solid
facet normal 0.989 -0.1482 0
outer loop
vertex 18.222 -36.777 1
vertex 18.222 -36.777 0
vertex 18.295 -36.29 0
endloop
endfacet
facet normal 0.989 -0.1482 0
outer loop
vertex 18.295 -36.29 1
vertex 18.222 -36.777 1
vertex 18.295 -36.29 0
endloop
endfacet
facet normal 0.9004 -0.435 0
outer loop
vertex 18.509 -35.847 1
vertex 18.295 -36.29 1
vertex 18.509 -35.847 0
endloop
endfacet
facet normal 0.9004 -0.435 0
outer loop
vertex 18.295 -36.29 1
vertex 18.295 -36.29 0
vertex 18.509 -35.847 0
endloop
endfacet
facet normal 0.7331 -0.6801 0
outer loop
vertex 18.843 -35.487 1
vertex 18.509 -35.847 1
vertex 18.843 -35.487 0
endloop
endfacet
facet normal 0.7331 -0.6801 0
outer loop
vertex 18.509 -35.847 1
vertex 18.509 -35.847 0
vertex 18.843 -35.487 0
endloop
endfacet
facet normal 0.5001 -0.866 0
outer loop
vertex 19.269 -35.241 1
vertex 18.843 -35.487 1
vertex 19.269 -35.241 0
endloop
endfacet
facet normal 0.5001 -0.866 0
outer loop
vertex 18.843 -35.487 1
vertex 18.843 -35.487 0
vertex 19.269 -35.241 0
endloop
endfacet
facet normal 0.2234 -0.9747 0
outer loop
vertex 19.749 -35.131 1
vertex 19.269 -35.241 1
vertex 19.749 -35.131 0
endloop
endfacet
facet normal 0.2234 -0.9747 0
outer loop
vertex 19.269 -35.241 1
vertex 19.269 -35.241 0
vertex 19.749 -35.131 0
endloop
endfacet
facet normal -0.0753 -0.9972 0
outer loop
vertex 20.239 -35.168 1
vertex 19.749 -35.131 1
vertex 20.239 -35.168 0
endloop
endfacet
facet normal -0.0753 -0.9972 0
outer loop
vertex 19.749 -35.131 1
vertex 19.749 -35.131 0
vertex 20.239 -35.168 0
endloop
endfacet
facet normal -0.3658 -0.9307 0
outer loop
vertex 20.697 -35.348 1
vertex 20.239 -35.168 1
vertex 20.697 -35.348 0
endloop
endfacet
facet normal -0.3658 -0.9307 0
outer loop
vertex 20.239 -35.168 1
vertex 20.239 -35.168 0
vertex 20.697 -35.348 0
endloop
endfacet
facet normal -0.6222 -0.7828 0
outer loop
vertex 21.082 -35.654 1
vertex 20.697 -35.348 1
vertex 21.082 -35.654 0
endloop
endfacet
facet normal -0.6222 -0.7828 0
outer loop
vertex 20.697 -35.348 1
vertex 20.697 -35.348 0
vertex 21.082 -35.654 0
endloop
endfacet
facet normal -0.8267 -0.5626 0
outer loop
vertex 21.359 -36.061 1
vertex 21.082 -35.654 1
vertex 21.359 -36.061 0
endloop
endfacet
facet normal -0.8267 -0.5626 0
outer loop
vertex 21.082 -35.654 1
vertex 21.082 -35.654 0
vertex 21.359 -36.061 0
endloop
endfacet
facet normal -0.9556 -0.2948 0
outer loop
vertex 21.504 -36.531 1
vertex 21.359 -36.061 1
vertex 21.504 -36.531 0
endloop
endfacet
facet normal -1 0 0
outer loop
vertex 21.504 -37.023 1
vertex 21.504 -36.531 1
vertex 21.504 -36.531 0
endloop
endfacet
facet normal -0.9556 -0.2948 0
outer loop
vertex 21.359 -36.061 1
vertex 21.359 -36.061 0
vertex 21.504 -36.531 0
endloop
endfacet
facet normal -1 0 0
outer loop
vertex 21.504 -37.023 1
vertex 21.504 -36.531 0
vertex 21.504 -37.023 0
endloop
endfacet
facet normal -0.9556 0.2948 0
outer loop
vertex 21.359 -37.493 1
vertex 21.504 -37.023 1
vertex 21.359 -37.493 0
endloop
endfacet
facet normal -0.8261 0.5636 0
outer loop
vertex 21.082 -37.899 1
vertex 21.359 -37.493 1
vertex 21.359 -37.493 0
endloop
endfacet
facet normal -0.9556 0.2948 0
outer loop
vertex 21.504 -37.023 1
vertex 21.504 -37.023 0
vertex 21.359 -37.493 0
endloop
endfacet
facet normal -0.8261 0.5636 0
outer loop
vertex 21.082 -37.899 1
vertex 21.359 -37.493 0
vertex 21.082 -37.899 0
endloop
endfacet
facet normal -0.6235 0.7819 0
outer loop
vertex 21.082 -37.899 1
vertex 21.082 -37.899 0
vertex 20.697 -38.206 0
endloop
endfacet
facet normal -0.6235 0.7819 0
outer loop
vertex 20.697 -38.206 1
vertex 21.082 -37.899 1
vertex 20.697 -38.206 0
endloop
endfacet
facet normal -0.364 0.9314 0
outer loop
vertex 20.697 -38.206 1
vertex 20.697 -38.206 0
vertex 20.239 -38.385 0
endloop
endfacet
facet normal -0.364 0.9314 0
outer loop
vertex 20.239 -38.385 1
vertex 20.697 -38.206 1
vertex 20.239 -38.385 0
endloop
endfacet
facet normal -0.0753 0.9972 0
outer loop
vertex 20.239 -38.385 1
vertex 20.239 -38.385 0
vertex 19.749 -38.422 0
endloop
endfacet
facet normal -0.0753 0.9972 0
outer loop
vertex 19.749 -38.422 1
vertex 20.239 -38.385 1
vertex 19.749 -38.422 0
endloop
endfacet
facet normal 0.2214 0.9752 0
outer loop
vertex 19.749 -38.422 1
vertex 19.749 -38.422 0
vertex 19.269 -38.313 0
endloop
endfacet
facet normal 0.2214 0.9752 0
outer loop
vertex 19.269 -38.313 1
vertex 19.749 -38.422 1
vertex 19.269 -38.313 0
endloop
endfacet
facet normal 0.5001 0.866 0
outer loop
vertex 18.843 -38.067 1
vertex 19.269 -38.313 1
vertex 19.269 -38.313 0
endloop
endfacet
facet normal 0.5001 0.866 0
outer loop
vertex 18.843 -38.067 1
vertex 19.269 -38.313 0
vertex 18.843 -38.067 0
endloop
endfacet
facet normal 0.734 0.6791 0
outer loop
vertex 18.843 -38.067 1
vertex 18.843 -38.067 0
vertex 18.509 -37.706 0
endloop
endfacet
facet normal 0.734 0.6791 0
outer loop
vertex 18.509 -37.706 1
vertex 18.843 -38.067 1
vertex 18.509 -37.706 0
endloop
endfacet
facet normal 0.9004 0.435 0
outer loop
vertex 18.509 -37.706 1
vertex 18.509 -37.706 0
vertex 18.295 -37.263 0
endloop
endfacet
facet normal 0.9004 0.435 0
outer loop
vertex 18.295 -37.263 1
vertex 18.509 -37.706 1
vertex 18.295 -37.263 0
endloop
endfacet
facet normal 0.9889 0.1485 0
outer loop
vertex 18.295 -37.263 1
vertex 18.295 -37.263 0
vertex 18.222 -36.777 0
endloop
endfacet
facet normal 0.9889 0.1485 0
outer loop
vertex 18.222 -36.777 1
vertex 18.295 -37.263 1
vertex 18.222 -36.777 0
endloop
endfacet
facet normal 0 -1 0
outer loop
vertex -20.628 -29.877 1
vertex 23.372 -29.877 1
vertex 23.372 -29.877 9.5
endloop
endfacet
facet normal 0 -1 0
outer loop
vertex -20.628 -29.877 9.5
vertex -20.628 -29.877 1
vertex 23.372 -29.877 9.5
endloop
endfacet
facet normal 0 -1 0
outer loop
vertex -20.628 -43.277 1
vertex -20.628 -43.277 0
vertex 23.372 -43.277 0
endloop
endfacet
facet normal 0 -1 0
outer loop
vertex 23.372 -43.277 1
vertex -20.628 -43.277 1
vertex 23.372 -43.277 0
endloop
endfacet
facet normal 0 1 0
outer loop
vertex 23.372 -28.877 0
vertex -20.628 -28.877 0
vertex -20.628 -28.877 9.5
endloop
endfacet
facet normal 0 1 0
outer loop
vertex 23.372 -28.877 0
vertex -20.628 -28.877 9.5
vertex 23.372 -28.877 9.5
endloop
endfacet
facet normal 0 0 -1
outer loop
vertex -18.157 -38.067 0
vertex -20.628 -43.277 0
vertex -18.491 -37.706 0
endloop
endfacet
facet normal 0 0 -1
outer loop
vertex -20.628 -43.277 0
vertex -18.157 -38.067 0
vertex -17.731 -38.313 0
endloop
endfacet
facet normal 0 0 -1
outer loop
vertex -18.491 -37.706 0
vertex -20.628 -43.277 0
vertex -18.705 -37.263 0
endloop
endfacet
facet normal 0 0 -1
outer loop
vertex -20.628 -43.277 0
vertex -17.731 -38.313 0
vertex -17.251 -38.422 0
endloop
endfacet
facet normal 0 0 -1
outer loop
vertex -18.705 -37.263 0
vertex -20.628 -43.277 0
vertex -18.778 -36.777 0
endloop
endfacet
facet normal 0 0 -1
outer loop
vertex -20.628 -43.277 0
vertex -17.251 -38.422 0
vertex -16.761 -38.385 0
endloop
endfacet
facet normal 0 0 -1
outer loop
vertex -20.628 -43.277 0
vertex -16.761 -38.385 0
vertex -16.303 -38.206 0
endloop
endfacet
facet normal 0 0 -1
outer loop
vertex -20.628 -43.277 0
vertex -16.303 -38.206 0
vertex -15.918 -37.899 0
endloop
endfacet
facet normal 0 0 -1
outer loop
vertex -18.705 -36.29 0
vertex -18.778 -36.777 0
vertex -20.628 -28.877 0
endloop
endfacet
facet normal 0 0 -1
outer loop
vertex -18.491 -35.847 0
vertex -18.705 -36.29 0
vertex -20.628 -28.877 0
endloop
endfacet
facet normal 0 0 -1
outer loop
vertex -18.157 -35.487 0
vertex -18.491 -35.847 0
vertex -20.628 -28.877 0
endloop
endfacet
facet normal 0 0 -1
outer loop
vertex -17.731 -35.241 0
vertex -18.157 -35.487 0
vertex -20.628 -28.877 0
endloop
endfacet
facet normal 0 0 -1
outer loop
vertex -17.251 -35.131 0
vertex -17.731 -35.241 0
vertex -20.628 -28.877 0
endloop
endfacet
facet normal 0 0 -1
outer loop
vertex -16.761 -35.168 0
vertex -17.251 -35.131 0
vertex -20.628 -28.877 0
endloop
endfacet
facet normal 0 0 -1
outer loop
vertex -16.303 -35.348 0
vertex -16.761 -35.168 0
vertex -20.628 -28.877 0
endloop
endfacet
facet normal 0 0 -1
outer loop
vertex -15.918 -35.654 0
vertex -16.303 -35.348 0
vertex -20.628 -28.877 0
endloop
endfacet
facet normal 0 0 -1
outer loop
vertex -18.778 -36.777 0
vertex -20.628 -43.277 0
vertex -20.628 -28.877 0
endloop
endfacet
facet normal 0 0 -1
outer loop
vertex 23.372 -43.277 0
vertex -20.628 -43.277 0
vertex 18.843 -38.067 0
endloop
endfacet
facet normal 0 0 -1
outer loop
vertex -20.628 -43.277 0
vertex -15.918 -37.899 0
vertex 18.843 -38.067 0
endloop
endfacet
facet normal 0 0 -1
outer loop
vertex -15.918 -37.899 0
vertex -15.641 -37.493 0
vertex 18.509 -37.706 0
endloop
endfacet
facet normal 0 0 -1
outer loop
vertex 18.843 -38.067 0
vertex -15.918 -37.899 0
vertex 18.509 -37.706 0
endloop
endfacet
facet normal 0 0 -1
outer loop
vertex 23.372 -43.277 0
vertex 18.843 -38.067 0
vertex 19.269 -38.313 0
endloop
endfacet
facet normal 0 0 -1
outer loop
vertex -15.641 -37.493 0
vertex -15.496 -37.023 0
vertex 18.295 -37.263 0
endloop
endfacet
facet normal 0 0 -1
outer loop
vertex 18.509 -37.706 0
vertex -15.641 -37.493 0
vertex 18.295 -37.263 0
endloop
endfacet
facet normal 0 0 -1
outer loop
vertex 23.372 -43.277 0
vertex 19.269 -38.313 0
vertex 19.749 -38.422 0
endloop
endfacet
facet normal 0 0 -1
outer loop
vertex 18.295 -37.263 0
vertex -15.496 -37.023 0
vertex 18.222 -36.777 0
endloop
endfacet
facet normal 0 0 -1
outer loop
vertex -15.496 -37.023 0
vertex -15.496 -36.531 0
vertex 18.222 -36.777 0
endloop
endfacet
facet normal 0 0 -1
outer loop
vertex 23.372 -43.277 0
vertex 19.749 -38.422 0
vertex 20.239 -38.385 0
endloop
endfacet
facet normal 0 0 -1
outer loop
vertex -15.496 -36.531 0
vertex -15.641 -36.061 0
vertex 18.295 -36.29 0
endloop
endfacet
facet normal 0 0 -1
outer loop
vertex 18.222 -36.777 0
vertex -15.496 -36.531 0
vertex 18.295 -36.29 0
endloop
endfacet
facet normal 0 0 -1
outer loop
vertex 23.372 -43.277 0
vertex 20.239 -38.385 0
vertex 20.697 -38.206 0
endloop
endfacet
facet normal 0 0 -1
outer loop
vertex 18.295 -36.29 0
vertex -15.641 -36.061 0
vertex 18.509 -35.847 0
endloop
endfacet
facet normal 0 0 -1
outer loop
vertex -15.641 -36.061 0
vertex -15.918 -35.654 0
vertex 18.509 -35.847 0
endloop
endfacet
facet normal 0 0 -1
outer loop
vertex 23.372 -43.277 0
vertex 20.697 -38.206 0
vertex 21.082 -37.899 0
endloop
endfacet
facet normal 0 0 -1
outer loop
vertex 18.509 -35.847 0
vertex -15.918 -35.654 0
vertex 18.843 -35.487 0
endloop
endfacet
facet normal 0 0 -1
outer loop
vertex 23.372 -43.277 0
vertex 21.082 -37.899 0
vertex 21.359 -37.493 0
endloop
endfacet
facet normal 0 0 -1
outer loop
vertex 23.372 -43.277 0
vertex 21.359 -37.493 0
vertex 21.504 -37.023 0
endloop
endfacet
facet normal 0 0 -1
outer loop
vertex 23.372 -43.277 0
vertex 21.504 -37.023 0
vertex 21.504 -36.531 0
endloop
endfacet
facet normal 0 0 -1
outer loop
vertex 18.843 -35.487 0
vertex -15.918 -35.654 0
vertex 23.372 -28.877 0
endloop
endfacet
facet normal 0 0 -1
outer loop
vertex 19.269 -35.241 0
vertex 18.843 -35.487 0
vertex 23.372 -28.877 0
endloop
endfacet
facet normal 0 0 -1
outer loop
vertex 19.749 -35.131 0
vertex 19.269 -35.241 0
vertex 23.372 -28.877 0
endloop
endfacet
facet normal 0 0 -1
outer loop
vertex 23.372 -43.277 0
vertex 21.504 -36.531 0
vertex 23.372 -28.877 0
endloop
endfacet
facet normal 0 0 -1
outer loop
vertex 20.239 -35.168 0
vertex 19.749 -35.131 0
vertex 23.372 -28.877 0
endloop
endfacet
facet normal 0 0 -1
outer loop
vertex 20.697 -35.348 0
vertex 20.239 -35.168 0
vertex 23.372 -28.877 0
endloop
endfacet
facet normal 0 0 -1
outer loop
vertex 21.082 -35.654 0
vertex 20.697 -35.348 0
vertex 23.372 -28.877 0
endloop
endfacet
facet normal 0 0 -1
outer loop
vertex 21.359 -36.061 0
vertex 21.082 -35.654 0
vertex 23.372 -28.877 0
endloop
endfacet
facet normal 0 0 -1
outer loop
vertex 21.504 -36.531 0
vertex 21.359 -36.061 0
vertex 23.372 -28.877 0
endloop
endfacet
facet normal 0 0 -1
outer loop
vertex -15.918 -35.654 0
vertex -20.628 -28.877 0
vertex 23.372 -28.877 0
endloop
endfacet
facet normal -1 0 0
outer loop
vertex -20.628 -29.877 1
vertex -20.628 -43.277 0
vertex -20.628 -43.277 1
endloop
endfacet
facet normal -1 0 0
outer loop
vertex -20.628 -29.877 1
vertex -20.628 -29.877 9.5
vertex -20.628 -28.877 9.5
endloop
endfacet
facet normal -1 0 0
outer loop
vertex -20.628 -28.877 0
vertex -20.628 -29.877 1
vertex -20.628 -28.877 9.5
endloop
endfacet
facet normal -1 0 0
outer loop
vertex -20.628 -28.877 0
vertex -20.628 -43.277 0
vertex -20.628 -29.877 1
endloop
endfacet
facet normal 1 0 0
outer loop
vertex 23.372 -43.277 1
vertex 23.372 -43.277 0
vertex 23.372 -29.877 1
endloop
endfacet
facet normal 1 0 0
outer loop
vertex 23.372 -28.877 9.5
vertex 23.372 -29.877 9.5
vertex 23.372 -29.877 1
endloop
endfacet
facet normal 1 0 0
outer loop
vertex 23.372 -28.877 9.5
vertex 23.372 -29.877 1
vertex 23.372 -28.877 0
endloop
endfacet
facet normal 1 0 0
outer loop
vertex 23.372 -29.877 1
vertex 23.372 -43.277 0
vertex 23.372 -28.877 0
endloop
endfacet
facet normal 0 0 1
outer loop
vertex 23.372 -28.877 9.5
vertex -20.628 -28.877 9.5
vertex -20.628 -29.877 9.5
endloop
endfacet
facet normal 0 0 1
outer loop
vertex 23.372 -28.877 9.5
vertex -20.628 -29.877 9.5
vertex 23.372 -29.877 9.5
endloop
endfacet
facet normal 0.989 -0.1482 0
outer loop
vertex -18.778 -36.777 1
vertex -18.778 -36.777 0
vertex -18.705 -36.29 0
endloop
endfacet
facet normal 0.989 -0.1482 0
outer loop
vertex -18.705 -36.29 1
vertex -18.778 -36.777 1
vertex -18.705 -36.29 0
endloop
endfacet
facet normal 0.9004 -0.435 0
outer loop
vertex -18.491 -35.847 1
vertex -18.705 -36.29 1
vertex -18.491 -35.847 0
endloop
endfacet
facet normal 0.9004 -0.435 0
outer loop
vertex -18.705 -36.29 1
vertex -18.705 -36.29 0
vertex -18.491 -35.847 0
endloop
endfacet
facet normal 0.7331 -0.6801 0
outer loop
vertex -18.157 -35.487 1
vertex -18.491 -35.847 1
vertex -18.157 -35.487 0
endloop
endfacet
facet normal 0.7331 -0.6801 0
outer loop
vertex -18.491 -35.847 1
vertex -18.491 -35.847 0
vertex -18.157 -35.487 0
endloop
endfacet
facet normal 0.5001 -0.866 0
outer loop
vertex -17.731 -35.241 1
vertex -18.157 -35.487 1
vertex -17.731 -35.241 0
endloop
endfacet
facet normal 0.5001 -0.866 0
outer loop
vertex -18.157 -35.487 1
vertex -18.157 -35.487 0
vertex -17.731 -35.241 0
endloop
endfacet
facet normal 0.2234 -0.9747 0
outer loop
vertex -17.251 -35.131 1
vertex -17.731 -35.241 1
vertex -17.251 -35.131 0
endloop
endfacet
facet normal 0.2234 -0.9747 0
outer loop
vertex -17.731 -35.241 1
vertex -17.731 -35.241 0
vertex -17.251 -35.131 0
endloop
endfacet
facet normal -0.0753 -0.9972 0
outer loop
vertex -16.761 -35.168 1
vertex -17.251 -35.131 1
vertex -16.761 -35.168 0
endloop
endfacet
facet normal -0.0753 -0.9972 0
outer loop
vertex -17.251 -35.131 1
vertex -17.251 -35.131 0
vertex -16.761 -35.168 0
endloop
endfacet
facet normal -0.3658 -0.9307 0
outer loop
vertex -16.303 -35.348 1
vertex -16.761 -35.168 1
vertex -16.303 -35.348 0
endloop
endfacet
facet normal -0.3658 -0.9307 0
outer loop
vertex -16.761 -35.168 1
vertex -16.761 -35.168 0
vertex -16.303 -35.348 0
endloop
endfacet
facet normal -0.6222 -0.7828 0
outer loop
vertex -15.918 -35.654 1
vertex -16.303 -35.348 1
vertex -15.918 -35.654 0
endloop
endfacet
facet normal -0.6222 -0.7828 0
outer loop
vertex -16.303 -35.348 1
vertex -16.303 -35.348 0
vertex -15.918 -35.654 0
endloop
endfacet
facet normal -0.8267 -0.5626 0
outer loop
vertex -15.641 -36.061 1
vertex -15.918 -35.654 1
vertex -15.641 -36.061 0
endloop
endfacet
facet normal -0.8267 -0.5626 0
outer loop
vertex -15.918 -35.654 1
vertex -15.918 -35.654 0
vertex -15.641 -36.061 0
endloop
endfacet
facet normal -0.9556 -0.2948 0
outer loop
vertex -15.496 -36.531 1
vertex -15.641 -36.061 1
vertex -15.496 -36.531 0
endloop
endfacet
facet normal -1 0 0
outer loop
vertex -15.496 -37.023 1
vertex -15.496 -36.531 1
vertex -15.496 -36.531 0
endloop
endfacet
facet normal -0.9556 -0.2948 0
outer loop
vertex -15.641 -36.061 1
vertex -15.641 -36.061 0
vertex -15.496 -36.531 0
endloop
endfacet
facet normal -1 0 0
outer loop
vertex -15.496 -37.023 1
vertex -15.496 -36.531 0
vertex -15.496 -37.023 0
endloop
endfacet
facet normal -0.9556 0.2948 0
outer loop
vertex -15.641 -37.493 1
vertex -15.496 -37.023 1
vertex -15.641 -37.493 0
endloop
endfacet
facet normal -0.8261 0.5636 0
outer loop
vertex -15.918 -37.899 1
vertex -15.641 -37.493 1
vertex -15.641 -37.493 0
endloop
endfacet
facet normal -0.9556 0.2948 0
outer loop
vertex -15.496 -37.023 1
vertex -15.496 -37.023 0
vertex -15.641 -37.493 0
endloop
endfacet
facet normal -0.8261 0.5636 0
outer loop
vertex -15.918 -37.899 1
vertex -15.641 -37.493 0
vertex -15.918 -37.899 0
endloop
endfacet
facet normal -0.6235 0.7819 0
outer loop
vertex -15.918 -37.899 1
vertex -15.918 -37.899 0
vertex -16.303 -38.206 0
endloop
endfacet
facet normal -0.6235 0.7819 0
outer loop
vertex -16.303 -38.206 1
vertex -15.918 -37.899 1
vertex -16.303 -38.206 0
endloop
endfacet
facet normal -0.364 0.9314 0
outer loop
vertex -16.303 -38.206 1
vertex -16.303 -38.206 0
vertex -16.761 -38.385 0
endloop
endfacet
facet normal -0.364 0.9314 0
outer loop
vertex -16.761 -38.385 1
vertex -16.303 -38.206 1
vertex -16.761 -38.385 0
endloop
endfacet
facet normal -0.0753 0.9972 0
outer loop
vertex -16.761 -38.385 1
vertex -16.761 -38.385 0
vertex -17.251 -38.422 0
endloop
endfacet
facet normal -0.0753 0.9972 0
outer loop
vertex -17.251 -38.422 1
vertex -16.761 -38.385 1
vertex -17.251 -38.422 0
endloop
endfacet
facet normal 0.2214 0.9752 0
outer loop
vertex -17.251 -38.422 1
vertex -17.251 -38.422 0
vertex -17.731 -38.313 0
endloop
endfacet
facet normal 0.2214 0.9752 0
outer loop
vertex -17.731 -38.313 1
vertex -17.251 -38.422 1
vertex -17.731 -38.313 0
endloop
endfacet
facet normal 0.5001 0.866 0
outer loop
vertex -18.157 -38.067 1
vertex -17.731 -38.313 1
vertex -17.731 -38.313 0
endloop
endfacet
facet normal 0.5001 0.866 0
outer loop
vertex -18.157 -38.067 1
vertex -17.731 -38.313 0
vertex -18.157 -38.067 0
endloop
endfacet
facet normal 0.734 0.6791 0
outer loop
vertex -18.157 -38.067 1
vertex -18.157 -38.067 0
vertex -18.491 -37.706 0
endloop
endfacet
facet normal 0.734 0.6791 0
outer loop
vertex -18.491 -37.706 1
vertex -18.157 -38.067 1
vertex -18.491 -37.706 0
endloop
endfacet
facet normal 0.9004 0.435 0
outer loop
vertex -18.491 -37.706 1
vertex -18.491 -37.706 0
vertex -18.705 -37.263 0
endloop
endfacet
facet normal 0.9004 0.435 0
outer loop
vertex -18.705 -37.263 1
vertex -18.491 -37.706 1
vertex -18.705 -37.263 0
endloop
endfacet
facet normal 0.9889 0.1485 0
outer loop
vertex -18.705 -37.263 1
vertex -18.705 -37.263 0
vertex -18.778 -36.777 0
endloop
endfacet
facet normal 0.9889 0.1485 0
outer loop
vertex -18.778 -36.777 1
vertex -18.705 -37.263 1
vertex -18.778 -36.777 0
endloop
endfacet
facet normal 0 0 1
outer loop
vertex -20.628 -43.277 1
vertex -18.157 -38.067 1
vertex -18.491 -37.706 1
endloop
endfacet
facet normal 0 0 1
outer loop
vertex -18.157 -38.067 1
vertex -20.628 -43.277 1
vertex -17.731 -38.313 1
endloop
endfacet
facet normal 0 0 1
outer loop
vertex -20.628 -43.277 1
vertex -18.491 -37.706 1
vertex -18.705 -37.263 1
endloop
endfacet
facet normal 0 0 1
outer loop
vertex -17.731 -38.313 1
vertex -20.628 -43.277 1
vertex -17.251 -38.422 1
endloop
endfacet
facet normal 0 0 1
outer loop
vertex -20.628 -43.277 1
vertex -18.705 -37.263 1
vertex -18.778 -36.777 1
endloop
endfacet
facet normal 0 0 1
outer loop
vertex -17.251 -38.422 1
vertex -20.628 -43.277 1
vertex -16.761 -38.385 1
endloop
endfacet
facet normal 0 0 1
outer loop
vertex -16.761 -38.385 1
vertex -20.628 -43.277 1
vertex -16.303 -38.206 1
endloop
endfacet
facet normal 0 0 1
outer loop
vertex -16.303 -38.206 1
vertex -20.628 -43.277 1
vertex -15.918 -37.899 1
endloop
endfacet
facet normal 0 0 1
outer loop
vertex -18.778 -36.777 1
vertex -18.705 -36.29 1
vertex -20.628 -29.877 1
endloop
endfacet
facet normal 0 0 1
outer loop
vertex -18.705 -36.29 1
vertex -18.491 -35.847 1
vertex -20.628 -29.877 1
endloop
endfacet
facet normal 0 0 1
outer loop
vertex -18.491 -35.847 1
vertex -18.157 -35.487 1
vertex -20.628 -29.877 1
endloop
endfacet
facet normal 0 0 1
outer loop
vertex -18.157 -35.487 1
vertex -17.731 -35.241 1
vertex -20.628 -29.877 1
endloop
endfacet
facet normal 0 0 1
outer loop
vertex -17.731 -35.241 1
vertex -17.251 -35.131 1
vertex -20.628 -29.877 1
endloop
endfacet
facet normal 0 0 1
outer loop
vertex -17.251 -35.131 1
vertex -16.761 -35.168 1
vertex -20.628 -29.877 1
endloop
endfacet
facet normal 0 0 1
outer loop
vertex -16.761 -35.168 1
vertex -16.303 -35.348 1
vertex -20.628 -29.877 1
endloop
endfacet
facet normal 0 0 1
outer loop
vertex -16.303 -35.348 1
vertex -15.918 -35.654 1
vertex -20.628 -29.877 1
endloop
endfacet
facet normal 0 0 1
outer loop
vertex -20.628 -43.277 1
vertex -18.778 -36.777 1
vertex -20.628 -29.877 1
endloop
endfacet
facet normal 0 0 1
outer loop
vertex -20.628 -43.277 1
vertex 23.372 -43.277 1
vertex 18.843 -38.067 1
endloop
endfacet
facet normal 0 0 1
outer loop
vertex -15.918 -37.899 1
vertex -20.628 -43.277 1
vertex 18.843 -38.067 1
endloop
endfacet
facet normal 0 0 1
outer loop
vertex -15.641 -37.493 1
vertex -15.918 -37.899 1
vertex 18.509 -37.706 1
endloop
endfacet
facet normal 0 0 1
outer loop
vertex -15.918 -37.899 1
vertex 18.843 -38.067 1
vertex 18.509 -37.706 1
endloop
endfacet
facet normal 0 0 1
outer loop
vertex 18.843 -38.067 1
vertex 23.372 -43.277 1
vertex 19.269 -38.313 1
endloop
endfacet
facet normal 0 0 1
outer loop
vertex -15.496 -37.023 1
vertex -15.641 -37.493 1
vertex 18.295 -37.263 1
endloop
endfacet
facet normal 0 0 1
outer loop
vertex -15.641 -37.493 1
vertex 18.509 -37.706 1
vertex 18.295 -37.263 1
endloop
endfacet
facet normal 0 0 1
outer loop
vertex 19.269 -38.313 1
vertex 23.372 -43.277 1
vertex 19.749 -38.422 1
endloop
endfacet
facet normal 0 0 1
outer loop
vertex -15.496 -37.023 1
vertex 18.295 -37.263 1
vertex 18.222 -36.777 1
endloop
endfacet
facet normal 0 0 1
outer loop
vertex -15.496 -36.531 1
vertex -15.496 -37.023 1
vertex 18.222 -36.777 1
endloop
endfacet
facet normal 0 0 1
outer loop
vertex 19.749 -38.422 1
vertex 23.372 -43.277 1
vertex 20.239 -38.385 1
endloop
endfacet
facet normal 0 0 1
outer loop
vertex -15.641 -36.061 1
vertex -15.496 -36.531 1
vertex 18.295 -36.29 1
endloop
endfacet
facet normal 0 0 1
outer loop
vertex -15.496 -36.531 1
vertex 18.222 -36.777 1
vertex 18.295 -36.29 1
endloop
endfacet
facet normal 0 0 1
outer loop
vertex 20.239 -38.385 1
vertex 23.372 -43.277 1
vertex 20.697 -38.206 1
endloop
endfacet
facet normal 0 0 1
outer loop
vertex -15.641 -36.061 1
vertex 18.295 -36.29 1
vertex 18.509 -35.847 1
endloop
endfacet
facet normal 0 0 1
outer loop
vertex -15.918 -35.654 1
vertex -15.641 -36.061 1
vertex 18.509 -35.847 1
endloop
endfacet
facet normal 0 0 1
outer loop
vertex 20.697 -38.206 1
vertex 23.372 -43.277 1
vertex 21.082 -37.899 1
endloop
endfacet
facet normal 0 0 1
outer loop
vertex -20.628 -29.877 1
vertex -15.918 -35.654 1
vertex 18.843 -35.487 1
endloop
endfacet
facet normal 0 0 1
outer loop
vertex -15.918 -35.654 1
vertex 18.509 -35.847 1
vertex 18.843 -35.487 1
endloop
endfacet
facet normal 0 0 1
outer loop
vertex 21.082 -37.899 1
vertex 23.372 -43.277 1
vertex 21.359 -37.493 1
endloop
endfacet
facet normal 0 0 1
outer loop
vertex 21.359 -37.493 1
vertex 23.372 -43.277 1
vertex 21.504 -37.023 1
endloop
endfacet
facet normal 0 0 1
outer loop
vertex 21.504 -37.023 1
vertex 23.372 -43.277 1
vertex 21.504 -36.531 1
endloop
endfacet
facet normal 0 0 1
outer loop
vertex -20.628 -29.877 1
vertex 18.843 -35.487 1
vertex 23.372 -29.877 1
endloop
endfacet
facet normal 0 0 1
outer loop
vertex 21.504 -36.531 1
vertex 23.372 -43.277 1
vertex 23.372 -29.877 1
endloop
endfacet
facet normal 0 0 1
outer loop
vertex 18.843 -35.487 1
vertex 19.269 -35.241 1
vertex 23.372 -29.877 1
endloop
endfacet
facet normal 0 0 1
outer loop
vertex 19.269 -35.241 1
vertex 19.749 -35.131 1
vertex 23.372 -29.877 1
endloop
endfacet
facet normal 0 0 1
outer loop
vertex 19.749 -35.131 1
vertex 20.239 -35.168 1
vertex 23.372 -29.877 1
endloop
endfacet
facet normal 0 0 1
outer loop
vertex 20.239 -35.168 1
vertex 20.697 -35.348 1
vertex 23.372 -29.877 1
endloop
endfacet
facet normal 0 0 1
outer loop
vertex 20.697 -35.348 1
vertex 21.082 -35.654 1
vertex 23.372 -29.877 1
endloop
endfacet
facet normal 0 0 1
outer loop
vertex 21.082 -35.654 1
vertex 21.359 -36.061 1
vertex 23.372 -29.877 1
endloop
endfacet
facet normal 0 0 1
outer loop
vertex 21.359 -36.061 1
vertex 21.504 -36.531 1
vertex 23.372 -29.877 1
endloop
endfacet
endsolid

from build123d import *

# Parameters (mm, degrees)
F0_W     = 44
F0_H     = 14.4
F1_DEPTH = 9.5
F2_W     = 13.4
F2_H     = 8.5
F3_DEPTH = 44
F5_D     = 3.3


with BuildPart() as f1:
    # F0 (on Top) → F1 (new body)
    with BuildSketch(Plane.XY):
        with Locations((1.3719686568, -36.0766266167)):
            Rectangle(F0_W, F0_H)
    extrude(amount=F1_DEPTH)

    # F2 (on face) → F3 (cut)
    with BuildSketch(Plane.YZ.offset(23.3719686568)):
        with Locations((-36.5766266167, 5.25)):
            Rectangle(F2_W, F2_H)
    extrude(amount=-F3_DEPTH, mode=Mode.SUBTRACT)

    # F5 (through all)
    with Locations(Plane.XY.offset(1)):
        with Locations((-17.1280313432, -36.7766266167), (19.8719686568, -36.7766266167)):
            Hole(F5_D / 2)


solid = f1.part
